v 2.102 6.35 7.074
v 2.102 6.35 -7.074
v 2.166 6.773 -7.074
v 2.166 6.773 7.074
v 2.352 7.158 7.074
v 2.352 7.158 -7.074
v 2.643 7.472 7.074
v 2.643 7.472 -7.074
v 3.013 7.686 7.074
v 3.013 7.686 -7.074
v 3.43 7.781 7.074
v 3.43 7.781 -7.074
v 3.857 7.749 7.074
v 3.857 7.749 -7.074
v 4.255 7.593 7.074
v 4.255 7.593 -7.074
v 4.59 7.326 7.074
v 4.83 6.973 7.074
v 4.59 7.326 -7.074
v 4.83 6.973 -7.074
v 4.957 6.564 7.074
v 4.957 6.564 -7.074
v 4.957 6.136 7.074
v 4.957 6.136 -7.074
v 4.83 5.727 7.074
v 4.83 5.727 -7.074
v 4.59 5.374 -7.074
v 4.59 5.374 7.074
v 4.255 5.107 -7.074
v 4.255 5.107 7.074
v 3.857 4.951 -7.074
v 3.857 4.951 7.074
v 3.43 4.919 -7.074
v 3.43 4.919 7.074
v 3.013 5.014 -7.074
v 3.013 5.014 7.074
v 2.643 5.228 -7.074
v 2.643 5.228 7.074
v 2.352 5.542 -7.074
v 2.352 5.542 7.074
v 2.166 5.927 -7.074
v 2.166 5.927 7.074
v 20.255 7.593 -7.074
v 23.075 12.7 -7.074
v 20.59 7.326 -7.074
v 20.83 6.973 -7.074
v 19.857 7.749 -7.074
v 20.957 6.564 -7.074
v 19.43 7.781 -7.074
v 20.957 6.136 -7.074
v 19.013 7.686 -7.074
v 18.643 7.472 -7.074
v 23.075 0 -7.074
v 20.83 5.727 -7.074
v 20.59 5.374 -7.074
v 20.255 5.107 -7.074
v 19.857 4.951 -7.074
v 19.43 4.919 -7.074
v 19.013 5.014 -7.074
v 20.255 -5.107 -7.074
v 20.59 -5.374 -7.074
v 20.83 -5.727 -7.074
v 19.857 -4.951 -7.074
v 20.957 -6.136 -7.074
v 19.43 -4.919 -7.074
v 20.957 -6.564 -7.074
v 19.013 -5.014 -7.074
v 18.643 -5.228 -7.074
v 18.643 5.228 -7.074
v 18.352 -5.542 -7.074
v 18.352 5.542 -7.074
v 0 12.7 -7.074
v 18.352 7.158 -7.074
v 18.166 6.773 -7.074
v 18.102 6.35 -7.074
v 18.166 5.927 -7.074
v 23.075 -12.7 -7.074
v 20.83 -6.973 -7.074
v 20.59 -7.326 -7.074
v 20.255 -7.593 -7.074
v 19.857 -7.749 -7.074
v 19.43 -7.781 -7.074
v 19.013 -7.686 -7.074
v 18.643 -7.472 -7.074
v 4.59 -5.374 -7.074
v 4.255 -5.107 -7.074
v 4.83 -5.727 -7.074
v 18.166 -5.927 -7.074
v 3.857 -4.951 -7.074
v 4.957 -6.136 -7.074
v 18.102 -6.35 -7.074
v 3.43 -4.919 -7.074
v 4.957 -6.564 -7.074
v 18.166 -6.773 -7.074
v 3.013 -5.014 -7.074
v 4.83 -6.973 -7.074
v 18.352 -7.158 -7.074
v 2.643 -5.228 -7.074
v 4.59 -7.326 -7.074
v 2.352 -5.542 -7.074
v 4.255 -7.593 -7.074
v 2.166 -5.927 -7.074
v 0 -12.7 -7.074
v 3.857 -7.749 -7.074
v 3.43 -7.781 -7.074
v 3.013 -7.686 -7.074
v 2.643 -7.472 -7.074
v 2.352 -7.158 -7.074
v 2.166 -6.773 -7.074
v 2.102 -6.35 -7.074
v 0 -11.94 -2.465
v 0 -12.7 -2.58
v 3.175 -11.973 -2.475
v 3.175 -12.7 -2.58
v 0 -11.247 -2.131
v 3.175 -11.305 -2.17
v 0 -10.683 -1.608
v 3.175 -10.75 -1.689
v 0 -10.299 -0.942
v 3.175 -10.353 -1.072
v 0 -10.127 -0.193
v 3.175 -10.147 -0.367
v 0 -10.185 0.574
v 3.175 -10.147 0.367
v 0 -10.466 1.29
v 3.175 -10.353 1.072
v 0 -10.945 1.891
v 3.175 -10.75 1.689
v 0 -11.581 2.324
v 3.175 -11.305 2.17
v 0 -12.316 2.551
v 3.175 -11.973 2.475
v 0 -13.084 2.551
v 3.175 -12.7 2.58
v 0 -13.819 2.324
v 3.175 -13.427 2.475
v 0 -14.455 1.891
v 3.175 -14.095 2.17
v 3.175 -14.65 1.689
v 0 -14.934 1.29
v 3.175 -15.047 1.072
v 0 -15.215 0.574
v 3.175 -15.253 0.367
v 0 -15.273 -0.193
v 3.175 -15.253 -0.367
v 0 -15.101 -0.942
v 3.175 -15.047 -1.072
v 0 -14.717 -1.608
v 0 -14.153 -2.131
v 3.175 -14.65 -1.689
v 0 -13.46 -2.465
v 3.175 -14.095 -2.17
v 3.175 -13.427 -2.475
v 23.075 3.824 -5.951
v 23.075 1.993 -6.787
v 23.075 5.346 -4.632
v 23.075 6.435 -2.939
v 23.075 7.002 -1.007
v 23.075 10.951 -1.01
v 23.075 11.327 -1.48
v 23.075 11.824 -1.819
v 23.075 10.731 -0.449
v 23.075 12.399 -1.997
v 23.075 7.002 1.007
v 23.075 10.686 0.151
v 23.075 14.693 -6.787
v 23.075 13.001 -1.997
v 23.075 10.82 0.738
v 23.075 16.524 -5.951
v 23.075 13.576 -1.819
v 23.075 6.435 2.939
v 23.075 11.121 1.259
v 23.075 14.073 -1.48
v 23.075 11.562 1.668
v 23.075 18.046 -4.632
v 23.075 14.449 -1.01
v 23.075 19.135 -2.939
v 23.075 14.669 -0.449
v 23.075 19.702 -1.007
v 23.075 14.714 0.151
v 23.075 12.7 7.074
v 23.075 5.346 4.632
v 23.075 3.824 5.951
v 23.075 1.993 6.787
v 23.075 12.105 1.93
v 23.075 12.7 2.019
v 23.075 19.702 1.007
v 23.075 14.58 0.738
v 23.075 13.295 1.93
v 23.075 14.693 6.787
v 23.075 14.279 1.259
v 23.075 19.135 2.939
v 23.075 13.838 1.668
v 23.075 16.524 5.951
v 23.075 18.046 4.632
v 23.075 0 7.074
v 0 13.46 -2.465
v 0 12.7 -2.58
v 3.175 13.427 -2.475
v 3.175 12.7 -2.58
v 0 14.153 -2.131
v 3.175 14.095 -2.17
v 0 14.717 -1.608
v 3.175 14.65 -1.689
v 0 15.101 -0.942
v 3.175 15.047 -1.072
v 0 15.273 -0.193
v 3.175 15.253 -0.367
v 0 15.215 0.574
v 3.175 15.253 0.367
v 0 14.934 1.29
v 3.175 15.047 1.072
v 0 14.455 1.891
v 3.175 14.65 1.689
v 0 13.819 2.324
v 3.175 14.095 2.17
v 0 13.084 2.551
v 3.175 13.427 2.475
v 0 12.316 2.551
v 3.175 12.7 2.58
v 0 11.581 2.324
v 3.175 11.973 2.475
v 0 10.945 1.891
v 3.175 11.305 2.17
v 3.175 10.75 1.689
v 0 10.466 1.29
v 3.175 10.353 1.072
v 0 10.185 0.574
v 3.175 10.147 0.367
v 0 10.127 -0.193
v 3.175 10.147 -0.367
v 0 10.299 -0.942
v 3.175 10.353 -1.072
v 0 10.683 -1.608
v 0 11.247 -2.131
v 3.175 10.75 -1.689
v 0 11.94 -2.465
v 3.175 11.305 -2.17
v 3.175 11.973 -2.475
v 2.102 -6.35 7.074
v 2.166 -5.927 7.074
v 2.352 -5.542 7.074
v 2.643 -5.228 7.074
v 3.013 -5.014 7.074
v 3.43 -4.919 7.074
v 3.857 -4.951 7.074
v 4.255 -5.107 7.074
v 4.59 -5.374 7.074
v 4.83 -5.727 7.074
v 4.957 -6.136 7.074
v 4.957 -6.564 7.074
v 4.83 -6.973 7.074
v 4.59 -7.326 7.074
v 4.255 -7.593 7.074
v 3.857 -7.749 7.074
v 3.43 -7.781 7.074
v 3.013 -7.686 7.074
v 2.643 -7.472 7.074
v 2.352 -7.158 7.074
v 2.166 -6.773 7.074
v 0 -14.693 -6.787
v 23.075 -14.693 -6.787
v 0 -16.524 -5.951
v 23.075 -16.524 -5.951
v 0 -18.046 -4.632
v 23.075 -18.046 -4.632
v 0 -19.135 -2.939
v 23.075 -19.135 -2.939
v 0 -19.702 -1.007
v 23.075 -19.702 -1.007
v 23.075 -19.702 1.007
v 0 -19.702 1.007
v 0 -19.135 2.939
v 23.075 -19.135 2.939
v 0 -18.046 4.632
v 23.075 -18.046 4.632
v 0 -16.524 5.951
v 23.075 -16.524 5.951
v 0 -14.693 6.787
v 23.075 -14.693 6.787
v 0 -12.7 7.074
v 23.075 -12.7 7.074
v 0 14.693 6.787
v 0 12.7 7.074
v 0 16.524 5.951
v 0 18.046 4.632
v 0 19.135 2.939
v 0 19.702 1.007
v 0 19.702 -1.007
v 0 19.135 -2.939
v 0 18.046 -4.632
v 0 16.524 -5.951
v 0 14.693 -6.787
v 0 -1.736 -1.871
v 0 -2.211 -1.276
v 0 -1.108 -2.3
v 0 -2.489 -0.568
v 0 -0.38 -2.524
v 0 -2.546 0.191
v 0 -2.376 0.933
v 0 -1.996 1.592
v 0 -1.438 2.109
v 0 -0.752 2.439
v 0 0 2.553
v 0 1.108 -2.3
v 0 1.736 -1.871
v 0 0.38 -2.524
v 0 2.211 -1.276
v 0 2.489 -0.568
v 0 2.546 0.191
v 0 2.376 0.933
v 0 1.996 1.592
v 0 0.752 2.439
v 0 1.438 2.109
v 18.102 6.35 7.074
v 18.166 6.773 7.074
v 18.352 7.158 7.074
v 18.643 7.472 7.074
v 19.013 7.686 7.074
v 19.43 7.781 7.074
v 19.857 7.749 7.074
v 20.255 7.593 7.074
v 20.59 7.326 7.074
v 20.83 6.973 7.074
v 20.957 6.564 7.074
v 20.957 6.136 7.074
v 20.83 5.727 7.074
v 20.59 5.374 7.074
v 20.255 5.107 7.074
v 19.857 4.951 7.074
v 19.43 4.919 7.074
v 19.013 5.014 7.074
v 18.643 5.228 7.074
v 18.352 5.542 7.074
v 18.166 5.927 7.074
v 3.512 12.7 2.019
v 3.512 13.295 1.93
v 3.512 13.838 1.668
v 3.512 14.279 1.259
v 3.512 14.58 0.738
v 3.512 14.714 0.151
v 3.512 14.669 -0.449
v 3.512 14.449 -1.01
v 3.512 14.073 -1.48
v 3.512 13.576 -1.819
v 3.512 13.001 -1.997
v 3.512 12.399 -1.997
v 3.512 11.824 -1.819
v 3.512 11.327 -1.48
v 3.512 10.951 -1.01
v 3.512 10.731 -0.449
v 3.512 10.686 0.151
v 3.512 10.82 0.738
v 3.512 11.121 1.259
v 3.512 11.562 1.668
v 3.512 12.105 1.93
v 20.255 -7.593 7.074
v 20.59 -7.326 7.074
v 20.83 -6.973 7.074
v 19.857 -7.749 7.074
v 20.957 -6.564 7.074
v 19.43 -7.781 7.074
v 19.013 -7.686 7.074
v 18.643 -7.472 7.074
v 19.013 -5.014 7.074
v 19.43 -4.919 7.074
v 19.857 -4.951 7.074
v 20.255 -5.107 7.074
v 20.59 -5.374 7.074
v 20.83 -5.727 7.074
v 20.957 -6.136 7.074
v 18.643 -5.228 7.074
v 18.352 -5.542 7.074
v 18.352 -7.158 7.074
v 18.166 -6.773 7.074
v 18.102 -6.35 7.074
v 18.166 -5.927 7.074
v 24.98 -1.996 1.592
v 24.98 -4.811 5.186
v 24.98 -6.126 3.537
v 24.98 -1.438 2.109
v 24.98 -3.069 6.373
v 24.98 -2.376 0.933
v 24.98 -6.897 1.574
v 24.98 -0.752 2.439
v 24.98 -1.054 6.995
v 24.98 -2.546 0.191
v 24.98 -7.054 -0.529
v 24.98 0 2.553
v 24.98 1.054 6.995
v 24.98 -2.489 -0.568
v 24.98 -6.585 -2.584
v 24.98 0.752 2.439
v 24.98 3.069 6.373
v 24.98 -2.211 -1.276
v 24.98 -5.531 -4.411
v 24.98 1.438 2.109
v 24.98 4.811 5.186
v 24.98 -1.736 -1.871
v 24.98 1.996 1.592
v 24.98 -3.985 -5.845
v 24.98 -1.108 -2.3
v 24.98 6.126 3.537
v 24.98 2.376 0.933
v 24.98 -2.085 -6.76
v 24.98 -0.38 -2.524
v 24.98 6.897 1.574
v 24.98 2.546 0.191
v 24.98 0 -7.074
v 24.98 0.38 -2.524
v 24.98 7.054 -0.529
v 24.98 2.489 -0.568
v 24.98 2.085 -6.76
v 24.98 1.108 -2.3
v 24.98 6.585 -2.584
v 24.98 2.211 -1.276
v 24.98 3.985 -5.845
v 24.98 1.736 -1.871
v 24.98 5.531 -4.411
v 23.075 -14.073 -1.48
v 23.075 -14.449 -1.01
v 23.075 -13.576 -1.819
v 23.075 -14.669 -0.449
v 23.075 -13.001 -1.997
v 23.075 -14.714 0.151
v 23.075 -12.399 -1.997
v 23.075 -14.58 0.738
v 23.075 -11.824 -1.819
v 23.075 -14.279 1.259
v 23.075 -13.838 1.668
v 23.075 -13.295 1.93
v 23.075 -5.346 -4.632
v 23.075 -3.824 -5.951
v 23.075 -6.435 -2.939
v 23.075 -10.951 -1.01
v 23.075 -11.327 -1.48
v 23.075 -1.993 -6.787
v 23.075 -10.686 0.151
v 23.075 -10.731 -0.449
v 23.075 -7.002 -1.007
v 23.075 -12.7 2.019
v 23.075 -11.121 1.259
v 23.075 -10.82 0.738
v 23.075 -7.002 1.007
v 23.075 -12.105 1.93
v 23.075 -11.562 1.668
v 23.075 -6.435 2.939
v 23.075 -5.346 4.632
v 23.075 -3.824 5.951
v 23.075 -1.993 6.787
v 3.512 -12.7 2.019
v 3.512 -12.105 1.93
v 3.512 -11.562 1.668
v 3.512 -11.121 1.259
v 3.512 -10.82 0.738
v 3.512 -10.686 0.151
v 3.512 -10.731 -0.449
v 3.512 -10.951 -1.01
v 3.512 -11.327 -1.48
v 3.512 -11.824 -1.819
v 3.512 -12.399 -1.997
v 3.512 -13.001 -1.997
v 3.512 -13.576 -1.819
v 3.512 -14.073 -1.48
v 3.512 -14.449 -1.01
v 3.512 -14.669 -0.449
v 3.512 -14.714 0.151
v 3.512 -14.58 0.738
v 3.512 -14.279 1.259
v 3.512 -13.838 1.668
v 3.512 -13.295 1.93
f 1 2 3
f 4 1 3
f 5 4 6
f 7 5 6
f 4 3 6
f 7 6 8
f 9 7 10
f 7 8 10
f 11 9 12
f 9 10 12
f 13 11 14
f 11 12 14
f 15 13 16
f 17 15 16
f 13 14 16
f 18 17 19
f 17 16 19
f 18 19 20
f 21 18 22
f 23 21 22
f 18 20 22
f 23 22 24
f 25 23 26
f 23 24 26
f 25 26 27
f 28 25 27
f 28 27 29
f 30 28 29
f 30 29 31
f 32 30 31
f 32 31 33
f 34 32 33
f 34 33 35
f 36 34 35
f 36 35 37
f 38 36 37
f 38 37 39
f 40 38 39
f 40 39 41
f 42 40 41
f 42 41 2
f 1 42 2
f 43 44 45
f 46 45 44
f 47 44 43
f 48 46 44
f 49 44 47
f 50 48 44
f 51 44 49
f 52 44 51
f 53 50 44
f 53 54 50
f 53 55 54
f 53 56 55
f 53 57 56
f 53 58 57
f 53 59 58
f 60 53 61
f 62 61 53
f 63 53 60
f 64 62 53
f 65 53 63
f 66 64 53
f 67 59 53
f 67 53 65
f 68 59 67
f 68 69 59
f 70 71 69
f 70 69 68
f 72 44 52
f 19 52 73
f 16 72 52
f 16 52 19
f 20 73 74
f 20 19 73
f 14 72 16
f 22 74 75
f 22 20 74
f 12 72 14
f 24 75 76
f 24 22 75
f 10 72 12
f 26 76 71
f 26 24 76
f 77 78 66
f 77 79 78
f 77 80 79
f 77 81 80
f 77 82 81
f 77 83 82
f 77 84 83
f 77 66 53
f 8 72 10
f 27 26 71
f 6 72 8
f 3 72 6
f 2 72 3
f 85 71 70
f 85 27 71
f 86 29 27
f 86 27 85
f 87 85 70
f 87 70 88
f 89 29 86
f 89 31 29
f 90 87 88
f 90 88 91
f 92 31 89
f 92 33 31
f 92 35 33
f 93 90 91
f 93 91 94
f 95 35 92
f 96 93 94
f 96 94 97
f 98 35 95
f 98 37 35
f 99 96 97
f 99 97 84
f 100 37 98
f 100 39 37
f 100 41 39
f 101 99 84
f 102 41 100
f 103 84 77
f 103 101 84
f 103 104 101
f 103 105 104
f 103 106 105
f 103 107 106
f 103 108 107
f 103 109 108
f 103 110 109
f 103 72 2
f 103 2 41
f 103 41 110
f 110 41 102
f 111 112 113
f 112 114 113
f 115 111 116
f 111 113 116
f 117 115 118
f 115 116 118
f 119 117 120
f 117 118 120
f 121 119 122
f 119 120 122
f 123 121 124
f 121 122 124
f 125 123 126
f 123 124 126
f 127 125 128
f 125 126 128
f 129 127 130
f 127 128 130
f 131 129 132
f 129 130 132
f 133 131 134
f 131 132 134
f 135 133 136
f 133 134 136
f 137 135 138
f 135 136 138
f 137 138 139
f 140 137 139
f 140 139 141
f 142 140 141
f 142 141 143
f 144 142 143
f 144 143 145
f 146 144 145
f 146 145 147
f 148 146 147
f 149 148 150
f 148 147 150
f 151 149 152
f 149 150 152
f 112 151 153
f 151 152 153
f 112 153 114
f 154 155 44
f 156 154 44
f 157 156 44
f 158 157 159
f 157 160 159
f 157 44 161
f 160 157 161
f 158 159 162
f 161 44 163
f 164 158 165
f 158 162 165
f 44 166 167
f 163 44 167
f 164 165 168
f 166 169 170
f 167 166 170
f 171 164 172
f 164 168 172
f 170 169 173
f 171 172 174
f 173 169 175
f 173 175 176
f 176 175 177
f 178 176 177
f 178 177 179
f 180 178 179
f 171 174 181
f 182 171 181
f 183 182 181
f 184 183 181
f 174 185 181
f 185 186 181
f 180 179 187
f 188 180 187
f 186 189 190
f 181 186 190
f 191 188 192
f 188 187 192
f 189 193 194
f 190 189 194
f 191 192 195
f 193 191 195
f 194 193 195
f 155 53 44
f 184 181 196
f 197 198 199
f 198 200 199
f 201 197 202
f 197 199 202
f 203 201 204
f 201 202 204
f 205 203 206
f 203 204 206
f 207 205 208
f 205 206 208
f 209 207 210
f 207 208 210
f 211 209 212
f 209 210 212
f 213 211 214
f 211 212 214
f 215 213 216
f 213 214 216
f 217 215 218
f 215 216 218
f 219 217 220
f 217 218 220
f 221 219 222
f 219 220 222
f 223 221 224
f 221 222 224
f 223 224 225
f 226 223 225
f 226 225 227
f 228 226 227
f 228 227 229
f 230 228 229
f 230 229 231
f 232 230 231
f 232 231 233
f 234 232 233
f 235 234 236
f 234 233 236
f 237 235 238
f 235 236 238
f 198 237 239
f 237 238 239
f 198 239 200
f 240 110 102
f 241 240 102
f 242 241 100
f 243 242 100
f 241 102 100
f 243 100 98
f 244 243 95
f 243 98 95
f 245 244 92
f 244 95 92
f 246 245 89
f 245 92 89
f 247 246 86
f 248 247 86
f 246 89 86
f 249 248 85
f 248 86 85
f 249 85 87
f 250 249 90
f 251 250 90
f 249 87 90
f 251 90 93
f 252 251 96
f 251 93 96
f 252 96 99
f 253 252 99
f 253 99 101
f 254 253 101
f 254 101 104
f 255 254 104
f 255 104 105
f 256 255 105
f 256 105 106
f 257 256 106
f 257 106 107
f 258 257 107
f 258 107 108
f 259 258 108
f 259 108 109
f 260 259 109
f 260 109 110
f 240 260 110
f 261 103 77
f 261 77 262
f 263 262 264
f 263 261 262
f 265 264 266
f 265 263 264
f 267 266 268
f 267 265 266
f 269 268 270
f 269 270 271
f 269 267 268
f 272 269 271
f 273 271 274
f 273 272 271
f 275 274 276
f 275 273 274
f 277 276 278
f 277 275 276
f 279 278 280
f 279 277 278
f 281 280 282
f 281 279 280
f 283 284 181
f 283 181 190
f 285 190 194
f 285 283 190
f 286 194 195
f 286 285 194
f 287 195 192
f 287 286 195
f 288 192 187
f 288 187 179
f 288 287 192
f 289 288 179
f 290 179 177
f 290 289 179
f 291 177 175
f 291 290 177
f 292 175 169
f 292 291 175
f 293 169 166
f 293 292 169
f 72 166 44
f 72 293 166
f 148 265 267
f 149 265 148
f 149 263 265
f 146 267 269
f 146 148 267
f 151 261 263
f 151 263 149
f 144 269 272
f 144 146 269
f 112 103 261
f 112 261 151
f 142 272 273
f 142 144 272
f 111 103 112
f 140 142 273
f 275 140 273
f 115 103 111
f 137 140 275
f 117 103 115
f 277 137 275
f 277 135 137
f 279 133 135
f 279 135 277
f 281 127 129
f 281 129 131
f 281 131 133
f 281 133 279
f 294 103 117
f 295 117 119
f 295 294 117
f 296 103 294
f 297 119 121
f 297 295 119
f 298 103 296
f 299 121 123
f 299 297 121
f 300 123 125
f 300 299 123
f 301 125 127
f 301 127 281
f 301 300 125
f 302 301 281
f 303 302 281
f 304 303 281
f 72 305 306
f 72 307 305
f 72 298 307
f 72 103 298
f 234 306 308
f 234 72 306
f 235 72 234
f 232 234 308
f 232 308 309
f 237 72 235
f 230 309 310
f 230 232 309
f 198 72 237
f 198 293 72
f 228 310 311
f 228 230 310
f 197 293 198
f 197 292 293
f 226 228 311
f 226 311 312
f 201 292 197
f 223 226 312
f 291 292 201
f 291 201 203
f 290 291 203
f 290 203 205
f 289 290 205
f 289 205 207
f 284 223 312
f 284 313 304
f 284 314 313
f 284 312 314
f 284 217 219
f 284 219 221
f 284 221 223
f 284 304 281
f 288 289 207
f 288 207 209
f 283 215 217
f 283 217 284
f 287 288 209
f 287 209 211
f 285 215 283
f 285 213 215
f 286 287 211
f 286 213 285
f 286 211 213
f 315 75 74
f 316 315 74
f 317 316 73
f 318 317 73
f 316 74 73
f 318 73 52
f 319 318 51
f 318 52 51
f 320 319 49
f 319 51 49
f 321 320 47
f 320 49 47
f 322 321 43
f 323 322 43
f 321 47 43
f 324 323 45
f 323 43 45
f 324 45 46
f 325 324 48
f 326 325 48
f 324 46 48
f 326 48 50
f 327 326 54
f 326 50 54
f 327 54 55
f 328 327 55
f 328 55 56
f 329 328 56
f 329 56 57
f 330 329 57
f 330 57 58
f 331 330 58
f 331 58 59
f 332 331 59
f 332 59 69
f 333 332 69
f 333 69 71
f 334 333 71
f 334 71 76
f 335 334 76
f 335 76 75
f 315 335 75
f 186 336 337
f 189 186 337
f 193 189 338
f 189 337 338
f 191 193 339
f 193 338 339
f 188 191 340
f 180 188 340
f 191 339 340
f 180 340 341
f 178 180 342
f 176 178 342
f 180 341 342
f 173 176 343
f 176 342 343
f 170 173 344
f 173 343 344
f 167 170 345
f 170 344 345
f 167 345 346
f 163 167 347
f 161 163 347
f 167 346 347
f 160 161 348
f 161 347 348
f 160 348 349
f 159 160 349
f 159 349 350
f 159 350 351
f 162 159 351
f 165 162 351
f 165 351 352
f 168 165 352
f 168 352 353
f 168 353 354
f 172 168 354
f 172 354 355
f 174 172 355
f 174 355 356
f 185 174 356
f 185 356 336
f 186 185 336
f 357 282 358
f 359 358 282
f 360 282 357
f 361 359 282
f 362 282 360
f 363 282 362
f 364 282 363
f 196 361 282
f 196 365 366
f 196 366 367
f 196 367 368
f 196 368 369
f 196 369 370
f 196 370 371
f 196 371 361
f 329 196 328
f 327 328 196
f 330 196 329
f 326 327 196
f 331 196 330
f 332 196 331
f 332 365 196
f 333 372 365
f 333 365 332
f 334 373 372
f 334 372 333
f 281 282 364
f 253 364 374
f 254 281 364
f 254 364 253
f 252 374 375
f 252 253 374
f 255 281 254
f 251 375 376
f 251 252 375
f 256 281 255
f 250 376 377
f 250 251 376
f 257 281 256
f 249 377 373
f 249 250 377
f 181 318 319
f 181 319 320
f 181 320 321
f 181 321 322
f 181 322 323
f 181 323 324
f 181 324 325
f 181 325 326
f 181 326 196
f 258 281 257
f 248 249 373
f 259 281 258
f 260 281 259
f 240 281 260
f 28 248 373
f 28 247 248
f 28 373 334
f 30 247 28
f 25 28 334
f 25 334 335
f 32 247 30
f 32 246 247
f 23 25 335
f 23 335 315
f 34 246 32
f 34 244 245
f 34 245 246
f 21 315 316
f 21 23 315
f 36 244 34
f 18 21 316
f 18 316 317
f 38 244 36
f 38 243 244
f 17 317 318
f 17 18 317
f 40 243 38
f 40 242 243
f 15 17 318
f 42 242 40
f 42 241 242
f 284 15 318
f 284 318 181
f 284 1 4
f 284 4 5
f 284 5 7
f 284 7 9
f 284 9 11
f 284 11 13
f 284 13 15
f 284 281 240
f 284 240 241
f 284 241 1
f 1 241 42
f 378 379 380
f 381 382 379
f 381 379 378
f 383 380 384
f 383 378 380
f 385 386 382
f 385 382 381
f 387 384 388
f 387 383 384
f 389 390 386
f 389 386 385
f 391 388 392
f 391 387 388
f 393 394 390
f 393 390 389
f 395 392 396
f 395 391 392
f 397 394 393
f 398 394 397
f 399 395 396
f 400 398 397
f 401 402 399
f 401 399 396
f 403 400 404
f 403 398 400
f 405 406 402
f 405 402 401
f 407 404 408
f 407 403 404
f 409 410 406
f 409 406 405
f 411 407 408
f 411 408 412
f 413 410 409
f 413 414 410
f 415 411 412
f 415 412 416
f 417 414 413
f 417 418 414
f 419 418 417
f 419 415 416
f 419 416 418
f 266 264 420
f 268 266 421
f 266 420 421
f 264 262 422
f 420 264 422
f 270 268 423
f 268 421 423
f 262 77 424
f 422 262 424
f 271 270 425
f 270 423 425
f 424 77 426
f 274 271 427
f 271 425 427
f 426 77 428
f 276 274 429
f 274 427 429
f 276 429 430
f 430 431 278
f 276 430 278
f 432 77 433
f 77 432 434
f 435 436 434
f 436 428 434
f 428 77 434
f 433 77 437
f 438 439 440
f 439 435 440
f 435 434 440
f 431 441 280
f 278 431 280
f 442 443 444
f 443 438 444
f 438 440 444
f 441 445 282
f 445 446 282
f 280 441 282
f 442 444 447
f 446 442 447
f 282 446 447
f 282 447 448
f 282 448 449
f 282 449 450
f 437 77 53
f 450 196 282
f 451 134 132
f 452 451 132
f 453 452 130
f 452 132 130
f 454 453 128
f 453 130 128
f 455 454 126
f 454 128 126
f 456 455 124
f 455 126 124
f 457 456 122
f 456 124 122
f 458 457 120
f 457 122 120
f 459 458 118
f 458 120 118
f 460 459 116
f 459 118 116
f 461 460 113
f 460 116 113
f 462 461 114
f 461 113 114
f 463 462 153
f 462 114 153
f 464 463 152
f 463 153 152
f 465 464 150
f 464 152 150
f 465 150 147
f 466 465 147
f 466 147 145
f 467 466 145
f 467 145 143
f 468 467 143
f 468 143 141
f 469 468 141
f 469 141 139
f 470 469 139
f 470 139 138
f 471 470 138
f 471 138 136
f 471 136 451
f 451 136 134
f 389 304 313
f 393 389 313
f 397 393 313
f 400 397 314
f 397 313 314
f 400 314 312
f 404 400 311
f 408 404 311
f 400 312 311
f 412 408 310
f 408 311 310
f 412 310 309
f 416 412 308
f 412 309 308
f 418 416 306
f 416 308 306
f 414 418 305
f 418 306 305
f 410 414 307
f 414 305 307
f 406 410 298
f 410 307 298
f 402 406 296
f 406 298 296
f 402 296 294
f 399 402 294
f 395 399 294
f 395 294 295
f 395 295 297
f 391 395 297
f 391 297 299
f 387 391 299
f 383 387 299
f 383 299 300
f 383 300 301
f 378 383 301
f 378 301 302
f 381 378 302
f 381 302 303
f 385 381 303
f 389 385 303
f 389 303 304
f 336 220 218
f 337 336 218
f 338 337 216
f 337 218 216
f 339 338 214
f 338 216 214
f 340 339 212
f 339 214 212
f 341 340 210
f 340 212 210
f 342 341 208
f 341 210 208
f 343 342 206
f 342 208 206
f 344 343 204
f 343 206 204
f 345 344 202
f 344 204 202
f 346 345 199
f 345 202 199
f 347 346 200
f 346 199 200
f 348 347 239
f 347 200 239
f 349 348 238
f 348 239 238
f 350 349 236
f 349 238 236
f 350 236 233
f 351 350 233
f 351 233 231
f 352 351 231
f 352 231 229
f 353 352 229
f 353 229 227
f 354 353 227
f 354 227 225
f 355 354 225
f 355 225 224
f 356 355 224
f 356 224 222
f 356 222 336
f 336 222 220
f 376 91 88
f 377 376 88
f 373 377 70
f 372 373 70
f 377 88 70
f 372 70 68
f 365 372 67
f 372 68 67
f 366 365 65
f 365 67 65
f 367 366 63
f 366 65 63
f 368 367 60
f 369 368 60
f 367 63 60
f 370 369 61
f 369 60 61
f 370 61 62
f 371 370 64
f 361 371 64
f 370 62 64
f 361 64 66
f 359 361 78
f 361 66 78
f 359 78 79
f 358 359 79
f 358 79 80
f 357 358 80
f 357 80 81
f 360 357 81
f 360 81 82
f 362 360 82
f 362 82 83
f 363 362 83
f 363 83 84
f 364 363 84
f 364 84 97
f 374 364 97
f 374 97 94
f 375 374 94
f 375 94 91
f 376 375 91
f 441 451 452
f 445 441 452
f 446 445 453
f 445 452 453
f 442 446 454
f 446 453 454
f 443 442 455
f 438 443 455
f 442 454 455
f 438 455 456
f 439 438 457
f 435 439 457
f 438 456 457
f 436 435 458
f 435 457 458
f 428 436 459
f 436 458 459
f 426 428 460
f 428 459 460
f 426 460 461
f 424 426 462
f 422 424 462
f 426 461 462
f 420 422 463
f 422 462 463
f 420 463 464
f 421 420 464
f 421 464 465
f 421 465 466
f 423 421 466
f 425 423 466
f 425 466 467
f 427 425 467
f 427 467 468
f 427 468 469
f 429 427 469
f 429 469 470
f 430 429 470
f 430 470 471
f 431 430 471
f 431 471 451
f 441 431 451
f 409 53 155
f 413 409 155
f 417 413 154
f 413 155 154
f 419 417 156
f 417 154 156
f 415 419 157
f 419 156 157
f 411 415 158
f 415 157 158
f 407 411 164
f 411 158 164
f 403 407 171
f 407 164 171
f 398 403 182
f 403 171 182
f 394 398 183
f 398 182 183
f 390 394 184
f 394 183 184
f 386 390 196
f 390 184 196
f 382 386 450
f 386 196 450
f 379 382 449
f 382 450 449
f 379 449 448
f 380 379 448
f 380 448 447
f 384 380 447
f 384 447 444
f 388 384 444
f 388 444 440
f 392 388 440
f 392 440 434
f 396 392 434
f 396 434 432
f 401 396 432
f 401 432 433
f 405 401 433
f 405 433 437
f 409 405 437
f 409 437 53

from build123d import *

# Parameters (mm, degrees)
BOSS_EXTRUDE1_DEPTH                  = 23.075011
SKETCH8_R                            = 7.0739
BOSS_EXTRUDE2_DEPTH                  = 1.905
F_1_4_20_TAPPED_HOLE1_D              = 5.1054
F_10_32_TAPPED_HOLE1_D               = 4.0386
F_6_40_TAPPED_HOLE1_D                = 2.8702
F_13_64_0_20313_DIAMETER_HOLE1_D     = 5.159502
F_13_64_0_20313_DIAMETER_HOLE1_DEPTH = 3.175
F_13_64_0_20313_DIAMETER_HOLE1_TIP   = 1.550070783


with BuildPart() as part:
    # Sketch1 → Boss-Extrude1 (new body)
    with BuildSketch(Plane(origin=(0, 0, 0), x_dir=(0, 0, -1), z_dir=(1, 0, 0))):
        with BuildLine():
            Line((7.0739, 12.7), (7.0739, -12.7))
            ThreePointArc((7.0739, -12.7), (0, -19.7739), (-7.0739, -12.7))
            Line((-7.0739, -12.7), (-7.0739, 12.7))
            ThreePointArc((-7.0739, 12.7), (0, 19.7739), (7.0739, 12.7))
        make_face()
    extrude(amount=BOSS_EXTRUDE1_DEPTH)

    # Sketch8 → Boss-Extrude2 (add)
    with BuildSketch(Plane(origin=(23.075011, 0, 0), x_dir=(0, 0, -1), z_dir=(1, 0, 0))):
        Circle(SKETCH8_R)
    extrude(amount=BOSS_EXTRUDE2_DEPTH)

    # 1/4-20 Tapped Hole1 (through all)
    with Locations(Plane(origin=(24.980011, 0, 0), x_dir=(0, 0, -1), z_dir=(1, 0, 0))):
        with Locations((0, 0)):
            Hole(F_1_4_20_TAPPED_HOLE1_D / 2)

    # #10-32 Tapped Hole1 (through all)
    with Locations(Plane(origin=(23.075011, 0, 0), x_dir=(0, 0, -1), z_dir=(1, 0, 0))):
        with Locations((0, 12.7), (0, -12.7)):
            Hole(F_10_32_TAPPED_HOLE1_D / 2)

    # #6-40 Tapped Hole1 (through all)
    with Locations(Plane.XY.offset(7.0739)):
        with Locations((3.5375055, 6.35), (19.5375055, 6.35), (3.5375055, -6.35), (19.5375055, -6.35)):
            Hole(F_6_40_TAPPED_HOLE1_D / 2)

    # 13/64 (0.20313) Diameter Hole1
    with Locations(Plane.ZY):
        with Locations((0, -12.7), (0, 12.7)):
            Hole(F_13_64_0_20313_DIAMETER_HOLE1_D / 2, depth=F_13_64_0_20313_DIAMETER_HOLE1_DEPTH)
            with Locations((0, 0, -(F_13_64_0_20313_DIAMETER_HOLE1_DEPTH + F_13_64_0_20313_DIAMETER_HOLE1_TIP / 2))):  # 118° drill point
                Cone(0, F_13_64_0_20313_DIAMETER_HOLE1_D / 2, F_13_64_0_20313_DIAMETER_HOLE1_TIP, mode=Mode.SUBTRACT)


solid = part.part
